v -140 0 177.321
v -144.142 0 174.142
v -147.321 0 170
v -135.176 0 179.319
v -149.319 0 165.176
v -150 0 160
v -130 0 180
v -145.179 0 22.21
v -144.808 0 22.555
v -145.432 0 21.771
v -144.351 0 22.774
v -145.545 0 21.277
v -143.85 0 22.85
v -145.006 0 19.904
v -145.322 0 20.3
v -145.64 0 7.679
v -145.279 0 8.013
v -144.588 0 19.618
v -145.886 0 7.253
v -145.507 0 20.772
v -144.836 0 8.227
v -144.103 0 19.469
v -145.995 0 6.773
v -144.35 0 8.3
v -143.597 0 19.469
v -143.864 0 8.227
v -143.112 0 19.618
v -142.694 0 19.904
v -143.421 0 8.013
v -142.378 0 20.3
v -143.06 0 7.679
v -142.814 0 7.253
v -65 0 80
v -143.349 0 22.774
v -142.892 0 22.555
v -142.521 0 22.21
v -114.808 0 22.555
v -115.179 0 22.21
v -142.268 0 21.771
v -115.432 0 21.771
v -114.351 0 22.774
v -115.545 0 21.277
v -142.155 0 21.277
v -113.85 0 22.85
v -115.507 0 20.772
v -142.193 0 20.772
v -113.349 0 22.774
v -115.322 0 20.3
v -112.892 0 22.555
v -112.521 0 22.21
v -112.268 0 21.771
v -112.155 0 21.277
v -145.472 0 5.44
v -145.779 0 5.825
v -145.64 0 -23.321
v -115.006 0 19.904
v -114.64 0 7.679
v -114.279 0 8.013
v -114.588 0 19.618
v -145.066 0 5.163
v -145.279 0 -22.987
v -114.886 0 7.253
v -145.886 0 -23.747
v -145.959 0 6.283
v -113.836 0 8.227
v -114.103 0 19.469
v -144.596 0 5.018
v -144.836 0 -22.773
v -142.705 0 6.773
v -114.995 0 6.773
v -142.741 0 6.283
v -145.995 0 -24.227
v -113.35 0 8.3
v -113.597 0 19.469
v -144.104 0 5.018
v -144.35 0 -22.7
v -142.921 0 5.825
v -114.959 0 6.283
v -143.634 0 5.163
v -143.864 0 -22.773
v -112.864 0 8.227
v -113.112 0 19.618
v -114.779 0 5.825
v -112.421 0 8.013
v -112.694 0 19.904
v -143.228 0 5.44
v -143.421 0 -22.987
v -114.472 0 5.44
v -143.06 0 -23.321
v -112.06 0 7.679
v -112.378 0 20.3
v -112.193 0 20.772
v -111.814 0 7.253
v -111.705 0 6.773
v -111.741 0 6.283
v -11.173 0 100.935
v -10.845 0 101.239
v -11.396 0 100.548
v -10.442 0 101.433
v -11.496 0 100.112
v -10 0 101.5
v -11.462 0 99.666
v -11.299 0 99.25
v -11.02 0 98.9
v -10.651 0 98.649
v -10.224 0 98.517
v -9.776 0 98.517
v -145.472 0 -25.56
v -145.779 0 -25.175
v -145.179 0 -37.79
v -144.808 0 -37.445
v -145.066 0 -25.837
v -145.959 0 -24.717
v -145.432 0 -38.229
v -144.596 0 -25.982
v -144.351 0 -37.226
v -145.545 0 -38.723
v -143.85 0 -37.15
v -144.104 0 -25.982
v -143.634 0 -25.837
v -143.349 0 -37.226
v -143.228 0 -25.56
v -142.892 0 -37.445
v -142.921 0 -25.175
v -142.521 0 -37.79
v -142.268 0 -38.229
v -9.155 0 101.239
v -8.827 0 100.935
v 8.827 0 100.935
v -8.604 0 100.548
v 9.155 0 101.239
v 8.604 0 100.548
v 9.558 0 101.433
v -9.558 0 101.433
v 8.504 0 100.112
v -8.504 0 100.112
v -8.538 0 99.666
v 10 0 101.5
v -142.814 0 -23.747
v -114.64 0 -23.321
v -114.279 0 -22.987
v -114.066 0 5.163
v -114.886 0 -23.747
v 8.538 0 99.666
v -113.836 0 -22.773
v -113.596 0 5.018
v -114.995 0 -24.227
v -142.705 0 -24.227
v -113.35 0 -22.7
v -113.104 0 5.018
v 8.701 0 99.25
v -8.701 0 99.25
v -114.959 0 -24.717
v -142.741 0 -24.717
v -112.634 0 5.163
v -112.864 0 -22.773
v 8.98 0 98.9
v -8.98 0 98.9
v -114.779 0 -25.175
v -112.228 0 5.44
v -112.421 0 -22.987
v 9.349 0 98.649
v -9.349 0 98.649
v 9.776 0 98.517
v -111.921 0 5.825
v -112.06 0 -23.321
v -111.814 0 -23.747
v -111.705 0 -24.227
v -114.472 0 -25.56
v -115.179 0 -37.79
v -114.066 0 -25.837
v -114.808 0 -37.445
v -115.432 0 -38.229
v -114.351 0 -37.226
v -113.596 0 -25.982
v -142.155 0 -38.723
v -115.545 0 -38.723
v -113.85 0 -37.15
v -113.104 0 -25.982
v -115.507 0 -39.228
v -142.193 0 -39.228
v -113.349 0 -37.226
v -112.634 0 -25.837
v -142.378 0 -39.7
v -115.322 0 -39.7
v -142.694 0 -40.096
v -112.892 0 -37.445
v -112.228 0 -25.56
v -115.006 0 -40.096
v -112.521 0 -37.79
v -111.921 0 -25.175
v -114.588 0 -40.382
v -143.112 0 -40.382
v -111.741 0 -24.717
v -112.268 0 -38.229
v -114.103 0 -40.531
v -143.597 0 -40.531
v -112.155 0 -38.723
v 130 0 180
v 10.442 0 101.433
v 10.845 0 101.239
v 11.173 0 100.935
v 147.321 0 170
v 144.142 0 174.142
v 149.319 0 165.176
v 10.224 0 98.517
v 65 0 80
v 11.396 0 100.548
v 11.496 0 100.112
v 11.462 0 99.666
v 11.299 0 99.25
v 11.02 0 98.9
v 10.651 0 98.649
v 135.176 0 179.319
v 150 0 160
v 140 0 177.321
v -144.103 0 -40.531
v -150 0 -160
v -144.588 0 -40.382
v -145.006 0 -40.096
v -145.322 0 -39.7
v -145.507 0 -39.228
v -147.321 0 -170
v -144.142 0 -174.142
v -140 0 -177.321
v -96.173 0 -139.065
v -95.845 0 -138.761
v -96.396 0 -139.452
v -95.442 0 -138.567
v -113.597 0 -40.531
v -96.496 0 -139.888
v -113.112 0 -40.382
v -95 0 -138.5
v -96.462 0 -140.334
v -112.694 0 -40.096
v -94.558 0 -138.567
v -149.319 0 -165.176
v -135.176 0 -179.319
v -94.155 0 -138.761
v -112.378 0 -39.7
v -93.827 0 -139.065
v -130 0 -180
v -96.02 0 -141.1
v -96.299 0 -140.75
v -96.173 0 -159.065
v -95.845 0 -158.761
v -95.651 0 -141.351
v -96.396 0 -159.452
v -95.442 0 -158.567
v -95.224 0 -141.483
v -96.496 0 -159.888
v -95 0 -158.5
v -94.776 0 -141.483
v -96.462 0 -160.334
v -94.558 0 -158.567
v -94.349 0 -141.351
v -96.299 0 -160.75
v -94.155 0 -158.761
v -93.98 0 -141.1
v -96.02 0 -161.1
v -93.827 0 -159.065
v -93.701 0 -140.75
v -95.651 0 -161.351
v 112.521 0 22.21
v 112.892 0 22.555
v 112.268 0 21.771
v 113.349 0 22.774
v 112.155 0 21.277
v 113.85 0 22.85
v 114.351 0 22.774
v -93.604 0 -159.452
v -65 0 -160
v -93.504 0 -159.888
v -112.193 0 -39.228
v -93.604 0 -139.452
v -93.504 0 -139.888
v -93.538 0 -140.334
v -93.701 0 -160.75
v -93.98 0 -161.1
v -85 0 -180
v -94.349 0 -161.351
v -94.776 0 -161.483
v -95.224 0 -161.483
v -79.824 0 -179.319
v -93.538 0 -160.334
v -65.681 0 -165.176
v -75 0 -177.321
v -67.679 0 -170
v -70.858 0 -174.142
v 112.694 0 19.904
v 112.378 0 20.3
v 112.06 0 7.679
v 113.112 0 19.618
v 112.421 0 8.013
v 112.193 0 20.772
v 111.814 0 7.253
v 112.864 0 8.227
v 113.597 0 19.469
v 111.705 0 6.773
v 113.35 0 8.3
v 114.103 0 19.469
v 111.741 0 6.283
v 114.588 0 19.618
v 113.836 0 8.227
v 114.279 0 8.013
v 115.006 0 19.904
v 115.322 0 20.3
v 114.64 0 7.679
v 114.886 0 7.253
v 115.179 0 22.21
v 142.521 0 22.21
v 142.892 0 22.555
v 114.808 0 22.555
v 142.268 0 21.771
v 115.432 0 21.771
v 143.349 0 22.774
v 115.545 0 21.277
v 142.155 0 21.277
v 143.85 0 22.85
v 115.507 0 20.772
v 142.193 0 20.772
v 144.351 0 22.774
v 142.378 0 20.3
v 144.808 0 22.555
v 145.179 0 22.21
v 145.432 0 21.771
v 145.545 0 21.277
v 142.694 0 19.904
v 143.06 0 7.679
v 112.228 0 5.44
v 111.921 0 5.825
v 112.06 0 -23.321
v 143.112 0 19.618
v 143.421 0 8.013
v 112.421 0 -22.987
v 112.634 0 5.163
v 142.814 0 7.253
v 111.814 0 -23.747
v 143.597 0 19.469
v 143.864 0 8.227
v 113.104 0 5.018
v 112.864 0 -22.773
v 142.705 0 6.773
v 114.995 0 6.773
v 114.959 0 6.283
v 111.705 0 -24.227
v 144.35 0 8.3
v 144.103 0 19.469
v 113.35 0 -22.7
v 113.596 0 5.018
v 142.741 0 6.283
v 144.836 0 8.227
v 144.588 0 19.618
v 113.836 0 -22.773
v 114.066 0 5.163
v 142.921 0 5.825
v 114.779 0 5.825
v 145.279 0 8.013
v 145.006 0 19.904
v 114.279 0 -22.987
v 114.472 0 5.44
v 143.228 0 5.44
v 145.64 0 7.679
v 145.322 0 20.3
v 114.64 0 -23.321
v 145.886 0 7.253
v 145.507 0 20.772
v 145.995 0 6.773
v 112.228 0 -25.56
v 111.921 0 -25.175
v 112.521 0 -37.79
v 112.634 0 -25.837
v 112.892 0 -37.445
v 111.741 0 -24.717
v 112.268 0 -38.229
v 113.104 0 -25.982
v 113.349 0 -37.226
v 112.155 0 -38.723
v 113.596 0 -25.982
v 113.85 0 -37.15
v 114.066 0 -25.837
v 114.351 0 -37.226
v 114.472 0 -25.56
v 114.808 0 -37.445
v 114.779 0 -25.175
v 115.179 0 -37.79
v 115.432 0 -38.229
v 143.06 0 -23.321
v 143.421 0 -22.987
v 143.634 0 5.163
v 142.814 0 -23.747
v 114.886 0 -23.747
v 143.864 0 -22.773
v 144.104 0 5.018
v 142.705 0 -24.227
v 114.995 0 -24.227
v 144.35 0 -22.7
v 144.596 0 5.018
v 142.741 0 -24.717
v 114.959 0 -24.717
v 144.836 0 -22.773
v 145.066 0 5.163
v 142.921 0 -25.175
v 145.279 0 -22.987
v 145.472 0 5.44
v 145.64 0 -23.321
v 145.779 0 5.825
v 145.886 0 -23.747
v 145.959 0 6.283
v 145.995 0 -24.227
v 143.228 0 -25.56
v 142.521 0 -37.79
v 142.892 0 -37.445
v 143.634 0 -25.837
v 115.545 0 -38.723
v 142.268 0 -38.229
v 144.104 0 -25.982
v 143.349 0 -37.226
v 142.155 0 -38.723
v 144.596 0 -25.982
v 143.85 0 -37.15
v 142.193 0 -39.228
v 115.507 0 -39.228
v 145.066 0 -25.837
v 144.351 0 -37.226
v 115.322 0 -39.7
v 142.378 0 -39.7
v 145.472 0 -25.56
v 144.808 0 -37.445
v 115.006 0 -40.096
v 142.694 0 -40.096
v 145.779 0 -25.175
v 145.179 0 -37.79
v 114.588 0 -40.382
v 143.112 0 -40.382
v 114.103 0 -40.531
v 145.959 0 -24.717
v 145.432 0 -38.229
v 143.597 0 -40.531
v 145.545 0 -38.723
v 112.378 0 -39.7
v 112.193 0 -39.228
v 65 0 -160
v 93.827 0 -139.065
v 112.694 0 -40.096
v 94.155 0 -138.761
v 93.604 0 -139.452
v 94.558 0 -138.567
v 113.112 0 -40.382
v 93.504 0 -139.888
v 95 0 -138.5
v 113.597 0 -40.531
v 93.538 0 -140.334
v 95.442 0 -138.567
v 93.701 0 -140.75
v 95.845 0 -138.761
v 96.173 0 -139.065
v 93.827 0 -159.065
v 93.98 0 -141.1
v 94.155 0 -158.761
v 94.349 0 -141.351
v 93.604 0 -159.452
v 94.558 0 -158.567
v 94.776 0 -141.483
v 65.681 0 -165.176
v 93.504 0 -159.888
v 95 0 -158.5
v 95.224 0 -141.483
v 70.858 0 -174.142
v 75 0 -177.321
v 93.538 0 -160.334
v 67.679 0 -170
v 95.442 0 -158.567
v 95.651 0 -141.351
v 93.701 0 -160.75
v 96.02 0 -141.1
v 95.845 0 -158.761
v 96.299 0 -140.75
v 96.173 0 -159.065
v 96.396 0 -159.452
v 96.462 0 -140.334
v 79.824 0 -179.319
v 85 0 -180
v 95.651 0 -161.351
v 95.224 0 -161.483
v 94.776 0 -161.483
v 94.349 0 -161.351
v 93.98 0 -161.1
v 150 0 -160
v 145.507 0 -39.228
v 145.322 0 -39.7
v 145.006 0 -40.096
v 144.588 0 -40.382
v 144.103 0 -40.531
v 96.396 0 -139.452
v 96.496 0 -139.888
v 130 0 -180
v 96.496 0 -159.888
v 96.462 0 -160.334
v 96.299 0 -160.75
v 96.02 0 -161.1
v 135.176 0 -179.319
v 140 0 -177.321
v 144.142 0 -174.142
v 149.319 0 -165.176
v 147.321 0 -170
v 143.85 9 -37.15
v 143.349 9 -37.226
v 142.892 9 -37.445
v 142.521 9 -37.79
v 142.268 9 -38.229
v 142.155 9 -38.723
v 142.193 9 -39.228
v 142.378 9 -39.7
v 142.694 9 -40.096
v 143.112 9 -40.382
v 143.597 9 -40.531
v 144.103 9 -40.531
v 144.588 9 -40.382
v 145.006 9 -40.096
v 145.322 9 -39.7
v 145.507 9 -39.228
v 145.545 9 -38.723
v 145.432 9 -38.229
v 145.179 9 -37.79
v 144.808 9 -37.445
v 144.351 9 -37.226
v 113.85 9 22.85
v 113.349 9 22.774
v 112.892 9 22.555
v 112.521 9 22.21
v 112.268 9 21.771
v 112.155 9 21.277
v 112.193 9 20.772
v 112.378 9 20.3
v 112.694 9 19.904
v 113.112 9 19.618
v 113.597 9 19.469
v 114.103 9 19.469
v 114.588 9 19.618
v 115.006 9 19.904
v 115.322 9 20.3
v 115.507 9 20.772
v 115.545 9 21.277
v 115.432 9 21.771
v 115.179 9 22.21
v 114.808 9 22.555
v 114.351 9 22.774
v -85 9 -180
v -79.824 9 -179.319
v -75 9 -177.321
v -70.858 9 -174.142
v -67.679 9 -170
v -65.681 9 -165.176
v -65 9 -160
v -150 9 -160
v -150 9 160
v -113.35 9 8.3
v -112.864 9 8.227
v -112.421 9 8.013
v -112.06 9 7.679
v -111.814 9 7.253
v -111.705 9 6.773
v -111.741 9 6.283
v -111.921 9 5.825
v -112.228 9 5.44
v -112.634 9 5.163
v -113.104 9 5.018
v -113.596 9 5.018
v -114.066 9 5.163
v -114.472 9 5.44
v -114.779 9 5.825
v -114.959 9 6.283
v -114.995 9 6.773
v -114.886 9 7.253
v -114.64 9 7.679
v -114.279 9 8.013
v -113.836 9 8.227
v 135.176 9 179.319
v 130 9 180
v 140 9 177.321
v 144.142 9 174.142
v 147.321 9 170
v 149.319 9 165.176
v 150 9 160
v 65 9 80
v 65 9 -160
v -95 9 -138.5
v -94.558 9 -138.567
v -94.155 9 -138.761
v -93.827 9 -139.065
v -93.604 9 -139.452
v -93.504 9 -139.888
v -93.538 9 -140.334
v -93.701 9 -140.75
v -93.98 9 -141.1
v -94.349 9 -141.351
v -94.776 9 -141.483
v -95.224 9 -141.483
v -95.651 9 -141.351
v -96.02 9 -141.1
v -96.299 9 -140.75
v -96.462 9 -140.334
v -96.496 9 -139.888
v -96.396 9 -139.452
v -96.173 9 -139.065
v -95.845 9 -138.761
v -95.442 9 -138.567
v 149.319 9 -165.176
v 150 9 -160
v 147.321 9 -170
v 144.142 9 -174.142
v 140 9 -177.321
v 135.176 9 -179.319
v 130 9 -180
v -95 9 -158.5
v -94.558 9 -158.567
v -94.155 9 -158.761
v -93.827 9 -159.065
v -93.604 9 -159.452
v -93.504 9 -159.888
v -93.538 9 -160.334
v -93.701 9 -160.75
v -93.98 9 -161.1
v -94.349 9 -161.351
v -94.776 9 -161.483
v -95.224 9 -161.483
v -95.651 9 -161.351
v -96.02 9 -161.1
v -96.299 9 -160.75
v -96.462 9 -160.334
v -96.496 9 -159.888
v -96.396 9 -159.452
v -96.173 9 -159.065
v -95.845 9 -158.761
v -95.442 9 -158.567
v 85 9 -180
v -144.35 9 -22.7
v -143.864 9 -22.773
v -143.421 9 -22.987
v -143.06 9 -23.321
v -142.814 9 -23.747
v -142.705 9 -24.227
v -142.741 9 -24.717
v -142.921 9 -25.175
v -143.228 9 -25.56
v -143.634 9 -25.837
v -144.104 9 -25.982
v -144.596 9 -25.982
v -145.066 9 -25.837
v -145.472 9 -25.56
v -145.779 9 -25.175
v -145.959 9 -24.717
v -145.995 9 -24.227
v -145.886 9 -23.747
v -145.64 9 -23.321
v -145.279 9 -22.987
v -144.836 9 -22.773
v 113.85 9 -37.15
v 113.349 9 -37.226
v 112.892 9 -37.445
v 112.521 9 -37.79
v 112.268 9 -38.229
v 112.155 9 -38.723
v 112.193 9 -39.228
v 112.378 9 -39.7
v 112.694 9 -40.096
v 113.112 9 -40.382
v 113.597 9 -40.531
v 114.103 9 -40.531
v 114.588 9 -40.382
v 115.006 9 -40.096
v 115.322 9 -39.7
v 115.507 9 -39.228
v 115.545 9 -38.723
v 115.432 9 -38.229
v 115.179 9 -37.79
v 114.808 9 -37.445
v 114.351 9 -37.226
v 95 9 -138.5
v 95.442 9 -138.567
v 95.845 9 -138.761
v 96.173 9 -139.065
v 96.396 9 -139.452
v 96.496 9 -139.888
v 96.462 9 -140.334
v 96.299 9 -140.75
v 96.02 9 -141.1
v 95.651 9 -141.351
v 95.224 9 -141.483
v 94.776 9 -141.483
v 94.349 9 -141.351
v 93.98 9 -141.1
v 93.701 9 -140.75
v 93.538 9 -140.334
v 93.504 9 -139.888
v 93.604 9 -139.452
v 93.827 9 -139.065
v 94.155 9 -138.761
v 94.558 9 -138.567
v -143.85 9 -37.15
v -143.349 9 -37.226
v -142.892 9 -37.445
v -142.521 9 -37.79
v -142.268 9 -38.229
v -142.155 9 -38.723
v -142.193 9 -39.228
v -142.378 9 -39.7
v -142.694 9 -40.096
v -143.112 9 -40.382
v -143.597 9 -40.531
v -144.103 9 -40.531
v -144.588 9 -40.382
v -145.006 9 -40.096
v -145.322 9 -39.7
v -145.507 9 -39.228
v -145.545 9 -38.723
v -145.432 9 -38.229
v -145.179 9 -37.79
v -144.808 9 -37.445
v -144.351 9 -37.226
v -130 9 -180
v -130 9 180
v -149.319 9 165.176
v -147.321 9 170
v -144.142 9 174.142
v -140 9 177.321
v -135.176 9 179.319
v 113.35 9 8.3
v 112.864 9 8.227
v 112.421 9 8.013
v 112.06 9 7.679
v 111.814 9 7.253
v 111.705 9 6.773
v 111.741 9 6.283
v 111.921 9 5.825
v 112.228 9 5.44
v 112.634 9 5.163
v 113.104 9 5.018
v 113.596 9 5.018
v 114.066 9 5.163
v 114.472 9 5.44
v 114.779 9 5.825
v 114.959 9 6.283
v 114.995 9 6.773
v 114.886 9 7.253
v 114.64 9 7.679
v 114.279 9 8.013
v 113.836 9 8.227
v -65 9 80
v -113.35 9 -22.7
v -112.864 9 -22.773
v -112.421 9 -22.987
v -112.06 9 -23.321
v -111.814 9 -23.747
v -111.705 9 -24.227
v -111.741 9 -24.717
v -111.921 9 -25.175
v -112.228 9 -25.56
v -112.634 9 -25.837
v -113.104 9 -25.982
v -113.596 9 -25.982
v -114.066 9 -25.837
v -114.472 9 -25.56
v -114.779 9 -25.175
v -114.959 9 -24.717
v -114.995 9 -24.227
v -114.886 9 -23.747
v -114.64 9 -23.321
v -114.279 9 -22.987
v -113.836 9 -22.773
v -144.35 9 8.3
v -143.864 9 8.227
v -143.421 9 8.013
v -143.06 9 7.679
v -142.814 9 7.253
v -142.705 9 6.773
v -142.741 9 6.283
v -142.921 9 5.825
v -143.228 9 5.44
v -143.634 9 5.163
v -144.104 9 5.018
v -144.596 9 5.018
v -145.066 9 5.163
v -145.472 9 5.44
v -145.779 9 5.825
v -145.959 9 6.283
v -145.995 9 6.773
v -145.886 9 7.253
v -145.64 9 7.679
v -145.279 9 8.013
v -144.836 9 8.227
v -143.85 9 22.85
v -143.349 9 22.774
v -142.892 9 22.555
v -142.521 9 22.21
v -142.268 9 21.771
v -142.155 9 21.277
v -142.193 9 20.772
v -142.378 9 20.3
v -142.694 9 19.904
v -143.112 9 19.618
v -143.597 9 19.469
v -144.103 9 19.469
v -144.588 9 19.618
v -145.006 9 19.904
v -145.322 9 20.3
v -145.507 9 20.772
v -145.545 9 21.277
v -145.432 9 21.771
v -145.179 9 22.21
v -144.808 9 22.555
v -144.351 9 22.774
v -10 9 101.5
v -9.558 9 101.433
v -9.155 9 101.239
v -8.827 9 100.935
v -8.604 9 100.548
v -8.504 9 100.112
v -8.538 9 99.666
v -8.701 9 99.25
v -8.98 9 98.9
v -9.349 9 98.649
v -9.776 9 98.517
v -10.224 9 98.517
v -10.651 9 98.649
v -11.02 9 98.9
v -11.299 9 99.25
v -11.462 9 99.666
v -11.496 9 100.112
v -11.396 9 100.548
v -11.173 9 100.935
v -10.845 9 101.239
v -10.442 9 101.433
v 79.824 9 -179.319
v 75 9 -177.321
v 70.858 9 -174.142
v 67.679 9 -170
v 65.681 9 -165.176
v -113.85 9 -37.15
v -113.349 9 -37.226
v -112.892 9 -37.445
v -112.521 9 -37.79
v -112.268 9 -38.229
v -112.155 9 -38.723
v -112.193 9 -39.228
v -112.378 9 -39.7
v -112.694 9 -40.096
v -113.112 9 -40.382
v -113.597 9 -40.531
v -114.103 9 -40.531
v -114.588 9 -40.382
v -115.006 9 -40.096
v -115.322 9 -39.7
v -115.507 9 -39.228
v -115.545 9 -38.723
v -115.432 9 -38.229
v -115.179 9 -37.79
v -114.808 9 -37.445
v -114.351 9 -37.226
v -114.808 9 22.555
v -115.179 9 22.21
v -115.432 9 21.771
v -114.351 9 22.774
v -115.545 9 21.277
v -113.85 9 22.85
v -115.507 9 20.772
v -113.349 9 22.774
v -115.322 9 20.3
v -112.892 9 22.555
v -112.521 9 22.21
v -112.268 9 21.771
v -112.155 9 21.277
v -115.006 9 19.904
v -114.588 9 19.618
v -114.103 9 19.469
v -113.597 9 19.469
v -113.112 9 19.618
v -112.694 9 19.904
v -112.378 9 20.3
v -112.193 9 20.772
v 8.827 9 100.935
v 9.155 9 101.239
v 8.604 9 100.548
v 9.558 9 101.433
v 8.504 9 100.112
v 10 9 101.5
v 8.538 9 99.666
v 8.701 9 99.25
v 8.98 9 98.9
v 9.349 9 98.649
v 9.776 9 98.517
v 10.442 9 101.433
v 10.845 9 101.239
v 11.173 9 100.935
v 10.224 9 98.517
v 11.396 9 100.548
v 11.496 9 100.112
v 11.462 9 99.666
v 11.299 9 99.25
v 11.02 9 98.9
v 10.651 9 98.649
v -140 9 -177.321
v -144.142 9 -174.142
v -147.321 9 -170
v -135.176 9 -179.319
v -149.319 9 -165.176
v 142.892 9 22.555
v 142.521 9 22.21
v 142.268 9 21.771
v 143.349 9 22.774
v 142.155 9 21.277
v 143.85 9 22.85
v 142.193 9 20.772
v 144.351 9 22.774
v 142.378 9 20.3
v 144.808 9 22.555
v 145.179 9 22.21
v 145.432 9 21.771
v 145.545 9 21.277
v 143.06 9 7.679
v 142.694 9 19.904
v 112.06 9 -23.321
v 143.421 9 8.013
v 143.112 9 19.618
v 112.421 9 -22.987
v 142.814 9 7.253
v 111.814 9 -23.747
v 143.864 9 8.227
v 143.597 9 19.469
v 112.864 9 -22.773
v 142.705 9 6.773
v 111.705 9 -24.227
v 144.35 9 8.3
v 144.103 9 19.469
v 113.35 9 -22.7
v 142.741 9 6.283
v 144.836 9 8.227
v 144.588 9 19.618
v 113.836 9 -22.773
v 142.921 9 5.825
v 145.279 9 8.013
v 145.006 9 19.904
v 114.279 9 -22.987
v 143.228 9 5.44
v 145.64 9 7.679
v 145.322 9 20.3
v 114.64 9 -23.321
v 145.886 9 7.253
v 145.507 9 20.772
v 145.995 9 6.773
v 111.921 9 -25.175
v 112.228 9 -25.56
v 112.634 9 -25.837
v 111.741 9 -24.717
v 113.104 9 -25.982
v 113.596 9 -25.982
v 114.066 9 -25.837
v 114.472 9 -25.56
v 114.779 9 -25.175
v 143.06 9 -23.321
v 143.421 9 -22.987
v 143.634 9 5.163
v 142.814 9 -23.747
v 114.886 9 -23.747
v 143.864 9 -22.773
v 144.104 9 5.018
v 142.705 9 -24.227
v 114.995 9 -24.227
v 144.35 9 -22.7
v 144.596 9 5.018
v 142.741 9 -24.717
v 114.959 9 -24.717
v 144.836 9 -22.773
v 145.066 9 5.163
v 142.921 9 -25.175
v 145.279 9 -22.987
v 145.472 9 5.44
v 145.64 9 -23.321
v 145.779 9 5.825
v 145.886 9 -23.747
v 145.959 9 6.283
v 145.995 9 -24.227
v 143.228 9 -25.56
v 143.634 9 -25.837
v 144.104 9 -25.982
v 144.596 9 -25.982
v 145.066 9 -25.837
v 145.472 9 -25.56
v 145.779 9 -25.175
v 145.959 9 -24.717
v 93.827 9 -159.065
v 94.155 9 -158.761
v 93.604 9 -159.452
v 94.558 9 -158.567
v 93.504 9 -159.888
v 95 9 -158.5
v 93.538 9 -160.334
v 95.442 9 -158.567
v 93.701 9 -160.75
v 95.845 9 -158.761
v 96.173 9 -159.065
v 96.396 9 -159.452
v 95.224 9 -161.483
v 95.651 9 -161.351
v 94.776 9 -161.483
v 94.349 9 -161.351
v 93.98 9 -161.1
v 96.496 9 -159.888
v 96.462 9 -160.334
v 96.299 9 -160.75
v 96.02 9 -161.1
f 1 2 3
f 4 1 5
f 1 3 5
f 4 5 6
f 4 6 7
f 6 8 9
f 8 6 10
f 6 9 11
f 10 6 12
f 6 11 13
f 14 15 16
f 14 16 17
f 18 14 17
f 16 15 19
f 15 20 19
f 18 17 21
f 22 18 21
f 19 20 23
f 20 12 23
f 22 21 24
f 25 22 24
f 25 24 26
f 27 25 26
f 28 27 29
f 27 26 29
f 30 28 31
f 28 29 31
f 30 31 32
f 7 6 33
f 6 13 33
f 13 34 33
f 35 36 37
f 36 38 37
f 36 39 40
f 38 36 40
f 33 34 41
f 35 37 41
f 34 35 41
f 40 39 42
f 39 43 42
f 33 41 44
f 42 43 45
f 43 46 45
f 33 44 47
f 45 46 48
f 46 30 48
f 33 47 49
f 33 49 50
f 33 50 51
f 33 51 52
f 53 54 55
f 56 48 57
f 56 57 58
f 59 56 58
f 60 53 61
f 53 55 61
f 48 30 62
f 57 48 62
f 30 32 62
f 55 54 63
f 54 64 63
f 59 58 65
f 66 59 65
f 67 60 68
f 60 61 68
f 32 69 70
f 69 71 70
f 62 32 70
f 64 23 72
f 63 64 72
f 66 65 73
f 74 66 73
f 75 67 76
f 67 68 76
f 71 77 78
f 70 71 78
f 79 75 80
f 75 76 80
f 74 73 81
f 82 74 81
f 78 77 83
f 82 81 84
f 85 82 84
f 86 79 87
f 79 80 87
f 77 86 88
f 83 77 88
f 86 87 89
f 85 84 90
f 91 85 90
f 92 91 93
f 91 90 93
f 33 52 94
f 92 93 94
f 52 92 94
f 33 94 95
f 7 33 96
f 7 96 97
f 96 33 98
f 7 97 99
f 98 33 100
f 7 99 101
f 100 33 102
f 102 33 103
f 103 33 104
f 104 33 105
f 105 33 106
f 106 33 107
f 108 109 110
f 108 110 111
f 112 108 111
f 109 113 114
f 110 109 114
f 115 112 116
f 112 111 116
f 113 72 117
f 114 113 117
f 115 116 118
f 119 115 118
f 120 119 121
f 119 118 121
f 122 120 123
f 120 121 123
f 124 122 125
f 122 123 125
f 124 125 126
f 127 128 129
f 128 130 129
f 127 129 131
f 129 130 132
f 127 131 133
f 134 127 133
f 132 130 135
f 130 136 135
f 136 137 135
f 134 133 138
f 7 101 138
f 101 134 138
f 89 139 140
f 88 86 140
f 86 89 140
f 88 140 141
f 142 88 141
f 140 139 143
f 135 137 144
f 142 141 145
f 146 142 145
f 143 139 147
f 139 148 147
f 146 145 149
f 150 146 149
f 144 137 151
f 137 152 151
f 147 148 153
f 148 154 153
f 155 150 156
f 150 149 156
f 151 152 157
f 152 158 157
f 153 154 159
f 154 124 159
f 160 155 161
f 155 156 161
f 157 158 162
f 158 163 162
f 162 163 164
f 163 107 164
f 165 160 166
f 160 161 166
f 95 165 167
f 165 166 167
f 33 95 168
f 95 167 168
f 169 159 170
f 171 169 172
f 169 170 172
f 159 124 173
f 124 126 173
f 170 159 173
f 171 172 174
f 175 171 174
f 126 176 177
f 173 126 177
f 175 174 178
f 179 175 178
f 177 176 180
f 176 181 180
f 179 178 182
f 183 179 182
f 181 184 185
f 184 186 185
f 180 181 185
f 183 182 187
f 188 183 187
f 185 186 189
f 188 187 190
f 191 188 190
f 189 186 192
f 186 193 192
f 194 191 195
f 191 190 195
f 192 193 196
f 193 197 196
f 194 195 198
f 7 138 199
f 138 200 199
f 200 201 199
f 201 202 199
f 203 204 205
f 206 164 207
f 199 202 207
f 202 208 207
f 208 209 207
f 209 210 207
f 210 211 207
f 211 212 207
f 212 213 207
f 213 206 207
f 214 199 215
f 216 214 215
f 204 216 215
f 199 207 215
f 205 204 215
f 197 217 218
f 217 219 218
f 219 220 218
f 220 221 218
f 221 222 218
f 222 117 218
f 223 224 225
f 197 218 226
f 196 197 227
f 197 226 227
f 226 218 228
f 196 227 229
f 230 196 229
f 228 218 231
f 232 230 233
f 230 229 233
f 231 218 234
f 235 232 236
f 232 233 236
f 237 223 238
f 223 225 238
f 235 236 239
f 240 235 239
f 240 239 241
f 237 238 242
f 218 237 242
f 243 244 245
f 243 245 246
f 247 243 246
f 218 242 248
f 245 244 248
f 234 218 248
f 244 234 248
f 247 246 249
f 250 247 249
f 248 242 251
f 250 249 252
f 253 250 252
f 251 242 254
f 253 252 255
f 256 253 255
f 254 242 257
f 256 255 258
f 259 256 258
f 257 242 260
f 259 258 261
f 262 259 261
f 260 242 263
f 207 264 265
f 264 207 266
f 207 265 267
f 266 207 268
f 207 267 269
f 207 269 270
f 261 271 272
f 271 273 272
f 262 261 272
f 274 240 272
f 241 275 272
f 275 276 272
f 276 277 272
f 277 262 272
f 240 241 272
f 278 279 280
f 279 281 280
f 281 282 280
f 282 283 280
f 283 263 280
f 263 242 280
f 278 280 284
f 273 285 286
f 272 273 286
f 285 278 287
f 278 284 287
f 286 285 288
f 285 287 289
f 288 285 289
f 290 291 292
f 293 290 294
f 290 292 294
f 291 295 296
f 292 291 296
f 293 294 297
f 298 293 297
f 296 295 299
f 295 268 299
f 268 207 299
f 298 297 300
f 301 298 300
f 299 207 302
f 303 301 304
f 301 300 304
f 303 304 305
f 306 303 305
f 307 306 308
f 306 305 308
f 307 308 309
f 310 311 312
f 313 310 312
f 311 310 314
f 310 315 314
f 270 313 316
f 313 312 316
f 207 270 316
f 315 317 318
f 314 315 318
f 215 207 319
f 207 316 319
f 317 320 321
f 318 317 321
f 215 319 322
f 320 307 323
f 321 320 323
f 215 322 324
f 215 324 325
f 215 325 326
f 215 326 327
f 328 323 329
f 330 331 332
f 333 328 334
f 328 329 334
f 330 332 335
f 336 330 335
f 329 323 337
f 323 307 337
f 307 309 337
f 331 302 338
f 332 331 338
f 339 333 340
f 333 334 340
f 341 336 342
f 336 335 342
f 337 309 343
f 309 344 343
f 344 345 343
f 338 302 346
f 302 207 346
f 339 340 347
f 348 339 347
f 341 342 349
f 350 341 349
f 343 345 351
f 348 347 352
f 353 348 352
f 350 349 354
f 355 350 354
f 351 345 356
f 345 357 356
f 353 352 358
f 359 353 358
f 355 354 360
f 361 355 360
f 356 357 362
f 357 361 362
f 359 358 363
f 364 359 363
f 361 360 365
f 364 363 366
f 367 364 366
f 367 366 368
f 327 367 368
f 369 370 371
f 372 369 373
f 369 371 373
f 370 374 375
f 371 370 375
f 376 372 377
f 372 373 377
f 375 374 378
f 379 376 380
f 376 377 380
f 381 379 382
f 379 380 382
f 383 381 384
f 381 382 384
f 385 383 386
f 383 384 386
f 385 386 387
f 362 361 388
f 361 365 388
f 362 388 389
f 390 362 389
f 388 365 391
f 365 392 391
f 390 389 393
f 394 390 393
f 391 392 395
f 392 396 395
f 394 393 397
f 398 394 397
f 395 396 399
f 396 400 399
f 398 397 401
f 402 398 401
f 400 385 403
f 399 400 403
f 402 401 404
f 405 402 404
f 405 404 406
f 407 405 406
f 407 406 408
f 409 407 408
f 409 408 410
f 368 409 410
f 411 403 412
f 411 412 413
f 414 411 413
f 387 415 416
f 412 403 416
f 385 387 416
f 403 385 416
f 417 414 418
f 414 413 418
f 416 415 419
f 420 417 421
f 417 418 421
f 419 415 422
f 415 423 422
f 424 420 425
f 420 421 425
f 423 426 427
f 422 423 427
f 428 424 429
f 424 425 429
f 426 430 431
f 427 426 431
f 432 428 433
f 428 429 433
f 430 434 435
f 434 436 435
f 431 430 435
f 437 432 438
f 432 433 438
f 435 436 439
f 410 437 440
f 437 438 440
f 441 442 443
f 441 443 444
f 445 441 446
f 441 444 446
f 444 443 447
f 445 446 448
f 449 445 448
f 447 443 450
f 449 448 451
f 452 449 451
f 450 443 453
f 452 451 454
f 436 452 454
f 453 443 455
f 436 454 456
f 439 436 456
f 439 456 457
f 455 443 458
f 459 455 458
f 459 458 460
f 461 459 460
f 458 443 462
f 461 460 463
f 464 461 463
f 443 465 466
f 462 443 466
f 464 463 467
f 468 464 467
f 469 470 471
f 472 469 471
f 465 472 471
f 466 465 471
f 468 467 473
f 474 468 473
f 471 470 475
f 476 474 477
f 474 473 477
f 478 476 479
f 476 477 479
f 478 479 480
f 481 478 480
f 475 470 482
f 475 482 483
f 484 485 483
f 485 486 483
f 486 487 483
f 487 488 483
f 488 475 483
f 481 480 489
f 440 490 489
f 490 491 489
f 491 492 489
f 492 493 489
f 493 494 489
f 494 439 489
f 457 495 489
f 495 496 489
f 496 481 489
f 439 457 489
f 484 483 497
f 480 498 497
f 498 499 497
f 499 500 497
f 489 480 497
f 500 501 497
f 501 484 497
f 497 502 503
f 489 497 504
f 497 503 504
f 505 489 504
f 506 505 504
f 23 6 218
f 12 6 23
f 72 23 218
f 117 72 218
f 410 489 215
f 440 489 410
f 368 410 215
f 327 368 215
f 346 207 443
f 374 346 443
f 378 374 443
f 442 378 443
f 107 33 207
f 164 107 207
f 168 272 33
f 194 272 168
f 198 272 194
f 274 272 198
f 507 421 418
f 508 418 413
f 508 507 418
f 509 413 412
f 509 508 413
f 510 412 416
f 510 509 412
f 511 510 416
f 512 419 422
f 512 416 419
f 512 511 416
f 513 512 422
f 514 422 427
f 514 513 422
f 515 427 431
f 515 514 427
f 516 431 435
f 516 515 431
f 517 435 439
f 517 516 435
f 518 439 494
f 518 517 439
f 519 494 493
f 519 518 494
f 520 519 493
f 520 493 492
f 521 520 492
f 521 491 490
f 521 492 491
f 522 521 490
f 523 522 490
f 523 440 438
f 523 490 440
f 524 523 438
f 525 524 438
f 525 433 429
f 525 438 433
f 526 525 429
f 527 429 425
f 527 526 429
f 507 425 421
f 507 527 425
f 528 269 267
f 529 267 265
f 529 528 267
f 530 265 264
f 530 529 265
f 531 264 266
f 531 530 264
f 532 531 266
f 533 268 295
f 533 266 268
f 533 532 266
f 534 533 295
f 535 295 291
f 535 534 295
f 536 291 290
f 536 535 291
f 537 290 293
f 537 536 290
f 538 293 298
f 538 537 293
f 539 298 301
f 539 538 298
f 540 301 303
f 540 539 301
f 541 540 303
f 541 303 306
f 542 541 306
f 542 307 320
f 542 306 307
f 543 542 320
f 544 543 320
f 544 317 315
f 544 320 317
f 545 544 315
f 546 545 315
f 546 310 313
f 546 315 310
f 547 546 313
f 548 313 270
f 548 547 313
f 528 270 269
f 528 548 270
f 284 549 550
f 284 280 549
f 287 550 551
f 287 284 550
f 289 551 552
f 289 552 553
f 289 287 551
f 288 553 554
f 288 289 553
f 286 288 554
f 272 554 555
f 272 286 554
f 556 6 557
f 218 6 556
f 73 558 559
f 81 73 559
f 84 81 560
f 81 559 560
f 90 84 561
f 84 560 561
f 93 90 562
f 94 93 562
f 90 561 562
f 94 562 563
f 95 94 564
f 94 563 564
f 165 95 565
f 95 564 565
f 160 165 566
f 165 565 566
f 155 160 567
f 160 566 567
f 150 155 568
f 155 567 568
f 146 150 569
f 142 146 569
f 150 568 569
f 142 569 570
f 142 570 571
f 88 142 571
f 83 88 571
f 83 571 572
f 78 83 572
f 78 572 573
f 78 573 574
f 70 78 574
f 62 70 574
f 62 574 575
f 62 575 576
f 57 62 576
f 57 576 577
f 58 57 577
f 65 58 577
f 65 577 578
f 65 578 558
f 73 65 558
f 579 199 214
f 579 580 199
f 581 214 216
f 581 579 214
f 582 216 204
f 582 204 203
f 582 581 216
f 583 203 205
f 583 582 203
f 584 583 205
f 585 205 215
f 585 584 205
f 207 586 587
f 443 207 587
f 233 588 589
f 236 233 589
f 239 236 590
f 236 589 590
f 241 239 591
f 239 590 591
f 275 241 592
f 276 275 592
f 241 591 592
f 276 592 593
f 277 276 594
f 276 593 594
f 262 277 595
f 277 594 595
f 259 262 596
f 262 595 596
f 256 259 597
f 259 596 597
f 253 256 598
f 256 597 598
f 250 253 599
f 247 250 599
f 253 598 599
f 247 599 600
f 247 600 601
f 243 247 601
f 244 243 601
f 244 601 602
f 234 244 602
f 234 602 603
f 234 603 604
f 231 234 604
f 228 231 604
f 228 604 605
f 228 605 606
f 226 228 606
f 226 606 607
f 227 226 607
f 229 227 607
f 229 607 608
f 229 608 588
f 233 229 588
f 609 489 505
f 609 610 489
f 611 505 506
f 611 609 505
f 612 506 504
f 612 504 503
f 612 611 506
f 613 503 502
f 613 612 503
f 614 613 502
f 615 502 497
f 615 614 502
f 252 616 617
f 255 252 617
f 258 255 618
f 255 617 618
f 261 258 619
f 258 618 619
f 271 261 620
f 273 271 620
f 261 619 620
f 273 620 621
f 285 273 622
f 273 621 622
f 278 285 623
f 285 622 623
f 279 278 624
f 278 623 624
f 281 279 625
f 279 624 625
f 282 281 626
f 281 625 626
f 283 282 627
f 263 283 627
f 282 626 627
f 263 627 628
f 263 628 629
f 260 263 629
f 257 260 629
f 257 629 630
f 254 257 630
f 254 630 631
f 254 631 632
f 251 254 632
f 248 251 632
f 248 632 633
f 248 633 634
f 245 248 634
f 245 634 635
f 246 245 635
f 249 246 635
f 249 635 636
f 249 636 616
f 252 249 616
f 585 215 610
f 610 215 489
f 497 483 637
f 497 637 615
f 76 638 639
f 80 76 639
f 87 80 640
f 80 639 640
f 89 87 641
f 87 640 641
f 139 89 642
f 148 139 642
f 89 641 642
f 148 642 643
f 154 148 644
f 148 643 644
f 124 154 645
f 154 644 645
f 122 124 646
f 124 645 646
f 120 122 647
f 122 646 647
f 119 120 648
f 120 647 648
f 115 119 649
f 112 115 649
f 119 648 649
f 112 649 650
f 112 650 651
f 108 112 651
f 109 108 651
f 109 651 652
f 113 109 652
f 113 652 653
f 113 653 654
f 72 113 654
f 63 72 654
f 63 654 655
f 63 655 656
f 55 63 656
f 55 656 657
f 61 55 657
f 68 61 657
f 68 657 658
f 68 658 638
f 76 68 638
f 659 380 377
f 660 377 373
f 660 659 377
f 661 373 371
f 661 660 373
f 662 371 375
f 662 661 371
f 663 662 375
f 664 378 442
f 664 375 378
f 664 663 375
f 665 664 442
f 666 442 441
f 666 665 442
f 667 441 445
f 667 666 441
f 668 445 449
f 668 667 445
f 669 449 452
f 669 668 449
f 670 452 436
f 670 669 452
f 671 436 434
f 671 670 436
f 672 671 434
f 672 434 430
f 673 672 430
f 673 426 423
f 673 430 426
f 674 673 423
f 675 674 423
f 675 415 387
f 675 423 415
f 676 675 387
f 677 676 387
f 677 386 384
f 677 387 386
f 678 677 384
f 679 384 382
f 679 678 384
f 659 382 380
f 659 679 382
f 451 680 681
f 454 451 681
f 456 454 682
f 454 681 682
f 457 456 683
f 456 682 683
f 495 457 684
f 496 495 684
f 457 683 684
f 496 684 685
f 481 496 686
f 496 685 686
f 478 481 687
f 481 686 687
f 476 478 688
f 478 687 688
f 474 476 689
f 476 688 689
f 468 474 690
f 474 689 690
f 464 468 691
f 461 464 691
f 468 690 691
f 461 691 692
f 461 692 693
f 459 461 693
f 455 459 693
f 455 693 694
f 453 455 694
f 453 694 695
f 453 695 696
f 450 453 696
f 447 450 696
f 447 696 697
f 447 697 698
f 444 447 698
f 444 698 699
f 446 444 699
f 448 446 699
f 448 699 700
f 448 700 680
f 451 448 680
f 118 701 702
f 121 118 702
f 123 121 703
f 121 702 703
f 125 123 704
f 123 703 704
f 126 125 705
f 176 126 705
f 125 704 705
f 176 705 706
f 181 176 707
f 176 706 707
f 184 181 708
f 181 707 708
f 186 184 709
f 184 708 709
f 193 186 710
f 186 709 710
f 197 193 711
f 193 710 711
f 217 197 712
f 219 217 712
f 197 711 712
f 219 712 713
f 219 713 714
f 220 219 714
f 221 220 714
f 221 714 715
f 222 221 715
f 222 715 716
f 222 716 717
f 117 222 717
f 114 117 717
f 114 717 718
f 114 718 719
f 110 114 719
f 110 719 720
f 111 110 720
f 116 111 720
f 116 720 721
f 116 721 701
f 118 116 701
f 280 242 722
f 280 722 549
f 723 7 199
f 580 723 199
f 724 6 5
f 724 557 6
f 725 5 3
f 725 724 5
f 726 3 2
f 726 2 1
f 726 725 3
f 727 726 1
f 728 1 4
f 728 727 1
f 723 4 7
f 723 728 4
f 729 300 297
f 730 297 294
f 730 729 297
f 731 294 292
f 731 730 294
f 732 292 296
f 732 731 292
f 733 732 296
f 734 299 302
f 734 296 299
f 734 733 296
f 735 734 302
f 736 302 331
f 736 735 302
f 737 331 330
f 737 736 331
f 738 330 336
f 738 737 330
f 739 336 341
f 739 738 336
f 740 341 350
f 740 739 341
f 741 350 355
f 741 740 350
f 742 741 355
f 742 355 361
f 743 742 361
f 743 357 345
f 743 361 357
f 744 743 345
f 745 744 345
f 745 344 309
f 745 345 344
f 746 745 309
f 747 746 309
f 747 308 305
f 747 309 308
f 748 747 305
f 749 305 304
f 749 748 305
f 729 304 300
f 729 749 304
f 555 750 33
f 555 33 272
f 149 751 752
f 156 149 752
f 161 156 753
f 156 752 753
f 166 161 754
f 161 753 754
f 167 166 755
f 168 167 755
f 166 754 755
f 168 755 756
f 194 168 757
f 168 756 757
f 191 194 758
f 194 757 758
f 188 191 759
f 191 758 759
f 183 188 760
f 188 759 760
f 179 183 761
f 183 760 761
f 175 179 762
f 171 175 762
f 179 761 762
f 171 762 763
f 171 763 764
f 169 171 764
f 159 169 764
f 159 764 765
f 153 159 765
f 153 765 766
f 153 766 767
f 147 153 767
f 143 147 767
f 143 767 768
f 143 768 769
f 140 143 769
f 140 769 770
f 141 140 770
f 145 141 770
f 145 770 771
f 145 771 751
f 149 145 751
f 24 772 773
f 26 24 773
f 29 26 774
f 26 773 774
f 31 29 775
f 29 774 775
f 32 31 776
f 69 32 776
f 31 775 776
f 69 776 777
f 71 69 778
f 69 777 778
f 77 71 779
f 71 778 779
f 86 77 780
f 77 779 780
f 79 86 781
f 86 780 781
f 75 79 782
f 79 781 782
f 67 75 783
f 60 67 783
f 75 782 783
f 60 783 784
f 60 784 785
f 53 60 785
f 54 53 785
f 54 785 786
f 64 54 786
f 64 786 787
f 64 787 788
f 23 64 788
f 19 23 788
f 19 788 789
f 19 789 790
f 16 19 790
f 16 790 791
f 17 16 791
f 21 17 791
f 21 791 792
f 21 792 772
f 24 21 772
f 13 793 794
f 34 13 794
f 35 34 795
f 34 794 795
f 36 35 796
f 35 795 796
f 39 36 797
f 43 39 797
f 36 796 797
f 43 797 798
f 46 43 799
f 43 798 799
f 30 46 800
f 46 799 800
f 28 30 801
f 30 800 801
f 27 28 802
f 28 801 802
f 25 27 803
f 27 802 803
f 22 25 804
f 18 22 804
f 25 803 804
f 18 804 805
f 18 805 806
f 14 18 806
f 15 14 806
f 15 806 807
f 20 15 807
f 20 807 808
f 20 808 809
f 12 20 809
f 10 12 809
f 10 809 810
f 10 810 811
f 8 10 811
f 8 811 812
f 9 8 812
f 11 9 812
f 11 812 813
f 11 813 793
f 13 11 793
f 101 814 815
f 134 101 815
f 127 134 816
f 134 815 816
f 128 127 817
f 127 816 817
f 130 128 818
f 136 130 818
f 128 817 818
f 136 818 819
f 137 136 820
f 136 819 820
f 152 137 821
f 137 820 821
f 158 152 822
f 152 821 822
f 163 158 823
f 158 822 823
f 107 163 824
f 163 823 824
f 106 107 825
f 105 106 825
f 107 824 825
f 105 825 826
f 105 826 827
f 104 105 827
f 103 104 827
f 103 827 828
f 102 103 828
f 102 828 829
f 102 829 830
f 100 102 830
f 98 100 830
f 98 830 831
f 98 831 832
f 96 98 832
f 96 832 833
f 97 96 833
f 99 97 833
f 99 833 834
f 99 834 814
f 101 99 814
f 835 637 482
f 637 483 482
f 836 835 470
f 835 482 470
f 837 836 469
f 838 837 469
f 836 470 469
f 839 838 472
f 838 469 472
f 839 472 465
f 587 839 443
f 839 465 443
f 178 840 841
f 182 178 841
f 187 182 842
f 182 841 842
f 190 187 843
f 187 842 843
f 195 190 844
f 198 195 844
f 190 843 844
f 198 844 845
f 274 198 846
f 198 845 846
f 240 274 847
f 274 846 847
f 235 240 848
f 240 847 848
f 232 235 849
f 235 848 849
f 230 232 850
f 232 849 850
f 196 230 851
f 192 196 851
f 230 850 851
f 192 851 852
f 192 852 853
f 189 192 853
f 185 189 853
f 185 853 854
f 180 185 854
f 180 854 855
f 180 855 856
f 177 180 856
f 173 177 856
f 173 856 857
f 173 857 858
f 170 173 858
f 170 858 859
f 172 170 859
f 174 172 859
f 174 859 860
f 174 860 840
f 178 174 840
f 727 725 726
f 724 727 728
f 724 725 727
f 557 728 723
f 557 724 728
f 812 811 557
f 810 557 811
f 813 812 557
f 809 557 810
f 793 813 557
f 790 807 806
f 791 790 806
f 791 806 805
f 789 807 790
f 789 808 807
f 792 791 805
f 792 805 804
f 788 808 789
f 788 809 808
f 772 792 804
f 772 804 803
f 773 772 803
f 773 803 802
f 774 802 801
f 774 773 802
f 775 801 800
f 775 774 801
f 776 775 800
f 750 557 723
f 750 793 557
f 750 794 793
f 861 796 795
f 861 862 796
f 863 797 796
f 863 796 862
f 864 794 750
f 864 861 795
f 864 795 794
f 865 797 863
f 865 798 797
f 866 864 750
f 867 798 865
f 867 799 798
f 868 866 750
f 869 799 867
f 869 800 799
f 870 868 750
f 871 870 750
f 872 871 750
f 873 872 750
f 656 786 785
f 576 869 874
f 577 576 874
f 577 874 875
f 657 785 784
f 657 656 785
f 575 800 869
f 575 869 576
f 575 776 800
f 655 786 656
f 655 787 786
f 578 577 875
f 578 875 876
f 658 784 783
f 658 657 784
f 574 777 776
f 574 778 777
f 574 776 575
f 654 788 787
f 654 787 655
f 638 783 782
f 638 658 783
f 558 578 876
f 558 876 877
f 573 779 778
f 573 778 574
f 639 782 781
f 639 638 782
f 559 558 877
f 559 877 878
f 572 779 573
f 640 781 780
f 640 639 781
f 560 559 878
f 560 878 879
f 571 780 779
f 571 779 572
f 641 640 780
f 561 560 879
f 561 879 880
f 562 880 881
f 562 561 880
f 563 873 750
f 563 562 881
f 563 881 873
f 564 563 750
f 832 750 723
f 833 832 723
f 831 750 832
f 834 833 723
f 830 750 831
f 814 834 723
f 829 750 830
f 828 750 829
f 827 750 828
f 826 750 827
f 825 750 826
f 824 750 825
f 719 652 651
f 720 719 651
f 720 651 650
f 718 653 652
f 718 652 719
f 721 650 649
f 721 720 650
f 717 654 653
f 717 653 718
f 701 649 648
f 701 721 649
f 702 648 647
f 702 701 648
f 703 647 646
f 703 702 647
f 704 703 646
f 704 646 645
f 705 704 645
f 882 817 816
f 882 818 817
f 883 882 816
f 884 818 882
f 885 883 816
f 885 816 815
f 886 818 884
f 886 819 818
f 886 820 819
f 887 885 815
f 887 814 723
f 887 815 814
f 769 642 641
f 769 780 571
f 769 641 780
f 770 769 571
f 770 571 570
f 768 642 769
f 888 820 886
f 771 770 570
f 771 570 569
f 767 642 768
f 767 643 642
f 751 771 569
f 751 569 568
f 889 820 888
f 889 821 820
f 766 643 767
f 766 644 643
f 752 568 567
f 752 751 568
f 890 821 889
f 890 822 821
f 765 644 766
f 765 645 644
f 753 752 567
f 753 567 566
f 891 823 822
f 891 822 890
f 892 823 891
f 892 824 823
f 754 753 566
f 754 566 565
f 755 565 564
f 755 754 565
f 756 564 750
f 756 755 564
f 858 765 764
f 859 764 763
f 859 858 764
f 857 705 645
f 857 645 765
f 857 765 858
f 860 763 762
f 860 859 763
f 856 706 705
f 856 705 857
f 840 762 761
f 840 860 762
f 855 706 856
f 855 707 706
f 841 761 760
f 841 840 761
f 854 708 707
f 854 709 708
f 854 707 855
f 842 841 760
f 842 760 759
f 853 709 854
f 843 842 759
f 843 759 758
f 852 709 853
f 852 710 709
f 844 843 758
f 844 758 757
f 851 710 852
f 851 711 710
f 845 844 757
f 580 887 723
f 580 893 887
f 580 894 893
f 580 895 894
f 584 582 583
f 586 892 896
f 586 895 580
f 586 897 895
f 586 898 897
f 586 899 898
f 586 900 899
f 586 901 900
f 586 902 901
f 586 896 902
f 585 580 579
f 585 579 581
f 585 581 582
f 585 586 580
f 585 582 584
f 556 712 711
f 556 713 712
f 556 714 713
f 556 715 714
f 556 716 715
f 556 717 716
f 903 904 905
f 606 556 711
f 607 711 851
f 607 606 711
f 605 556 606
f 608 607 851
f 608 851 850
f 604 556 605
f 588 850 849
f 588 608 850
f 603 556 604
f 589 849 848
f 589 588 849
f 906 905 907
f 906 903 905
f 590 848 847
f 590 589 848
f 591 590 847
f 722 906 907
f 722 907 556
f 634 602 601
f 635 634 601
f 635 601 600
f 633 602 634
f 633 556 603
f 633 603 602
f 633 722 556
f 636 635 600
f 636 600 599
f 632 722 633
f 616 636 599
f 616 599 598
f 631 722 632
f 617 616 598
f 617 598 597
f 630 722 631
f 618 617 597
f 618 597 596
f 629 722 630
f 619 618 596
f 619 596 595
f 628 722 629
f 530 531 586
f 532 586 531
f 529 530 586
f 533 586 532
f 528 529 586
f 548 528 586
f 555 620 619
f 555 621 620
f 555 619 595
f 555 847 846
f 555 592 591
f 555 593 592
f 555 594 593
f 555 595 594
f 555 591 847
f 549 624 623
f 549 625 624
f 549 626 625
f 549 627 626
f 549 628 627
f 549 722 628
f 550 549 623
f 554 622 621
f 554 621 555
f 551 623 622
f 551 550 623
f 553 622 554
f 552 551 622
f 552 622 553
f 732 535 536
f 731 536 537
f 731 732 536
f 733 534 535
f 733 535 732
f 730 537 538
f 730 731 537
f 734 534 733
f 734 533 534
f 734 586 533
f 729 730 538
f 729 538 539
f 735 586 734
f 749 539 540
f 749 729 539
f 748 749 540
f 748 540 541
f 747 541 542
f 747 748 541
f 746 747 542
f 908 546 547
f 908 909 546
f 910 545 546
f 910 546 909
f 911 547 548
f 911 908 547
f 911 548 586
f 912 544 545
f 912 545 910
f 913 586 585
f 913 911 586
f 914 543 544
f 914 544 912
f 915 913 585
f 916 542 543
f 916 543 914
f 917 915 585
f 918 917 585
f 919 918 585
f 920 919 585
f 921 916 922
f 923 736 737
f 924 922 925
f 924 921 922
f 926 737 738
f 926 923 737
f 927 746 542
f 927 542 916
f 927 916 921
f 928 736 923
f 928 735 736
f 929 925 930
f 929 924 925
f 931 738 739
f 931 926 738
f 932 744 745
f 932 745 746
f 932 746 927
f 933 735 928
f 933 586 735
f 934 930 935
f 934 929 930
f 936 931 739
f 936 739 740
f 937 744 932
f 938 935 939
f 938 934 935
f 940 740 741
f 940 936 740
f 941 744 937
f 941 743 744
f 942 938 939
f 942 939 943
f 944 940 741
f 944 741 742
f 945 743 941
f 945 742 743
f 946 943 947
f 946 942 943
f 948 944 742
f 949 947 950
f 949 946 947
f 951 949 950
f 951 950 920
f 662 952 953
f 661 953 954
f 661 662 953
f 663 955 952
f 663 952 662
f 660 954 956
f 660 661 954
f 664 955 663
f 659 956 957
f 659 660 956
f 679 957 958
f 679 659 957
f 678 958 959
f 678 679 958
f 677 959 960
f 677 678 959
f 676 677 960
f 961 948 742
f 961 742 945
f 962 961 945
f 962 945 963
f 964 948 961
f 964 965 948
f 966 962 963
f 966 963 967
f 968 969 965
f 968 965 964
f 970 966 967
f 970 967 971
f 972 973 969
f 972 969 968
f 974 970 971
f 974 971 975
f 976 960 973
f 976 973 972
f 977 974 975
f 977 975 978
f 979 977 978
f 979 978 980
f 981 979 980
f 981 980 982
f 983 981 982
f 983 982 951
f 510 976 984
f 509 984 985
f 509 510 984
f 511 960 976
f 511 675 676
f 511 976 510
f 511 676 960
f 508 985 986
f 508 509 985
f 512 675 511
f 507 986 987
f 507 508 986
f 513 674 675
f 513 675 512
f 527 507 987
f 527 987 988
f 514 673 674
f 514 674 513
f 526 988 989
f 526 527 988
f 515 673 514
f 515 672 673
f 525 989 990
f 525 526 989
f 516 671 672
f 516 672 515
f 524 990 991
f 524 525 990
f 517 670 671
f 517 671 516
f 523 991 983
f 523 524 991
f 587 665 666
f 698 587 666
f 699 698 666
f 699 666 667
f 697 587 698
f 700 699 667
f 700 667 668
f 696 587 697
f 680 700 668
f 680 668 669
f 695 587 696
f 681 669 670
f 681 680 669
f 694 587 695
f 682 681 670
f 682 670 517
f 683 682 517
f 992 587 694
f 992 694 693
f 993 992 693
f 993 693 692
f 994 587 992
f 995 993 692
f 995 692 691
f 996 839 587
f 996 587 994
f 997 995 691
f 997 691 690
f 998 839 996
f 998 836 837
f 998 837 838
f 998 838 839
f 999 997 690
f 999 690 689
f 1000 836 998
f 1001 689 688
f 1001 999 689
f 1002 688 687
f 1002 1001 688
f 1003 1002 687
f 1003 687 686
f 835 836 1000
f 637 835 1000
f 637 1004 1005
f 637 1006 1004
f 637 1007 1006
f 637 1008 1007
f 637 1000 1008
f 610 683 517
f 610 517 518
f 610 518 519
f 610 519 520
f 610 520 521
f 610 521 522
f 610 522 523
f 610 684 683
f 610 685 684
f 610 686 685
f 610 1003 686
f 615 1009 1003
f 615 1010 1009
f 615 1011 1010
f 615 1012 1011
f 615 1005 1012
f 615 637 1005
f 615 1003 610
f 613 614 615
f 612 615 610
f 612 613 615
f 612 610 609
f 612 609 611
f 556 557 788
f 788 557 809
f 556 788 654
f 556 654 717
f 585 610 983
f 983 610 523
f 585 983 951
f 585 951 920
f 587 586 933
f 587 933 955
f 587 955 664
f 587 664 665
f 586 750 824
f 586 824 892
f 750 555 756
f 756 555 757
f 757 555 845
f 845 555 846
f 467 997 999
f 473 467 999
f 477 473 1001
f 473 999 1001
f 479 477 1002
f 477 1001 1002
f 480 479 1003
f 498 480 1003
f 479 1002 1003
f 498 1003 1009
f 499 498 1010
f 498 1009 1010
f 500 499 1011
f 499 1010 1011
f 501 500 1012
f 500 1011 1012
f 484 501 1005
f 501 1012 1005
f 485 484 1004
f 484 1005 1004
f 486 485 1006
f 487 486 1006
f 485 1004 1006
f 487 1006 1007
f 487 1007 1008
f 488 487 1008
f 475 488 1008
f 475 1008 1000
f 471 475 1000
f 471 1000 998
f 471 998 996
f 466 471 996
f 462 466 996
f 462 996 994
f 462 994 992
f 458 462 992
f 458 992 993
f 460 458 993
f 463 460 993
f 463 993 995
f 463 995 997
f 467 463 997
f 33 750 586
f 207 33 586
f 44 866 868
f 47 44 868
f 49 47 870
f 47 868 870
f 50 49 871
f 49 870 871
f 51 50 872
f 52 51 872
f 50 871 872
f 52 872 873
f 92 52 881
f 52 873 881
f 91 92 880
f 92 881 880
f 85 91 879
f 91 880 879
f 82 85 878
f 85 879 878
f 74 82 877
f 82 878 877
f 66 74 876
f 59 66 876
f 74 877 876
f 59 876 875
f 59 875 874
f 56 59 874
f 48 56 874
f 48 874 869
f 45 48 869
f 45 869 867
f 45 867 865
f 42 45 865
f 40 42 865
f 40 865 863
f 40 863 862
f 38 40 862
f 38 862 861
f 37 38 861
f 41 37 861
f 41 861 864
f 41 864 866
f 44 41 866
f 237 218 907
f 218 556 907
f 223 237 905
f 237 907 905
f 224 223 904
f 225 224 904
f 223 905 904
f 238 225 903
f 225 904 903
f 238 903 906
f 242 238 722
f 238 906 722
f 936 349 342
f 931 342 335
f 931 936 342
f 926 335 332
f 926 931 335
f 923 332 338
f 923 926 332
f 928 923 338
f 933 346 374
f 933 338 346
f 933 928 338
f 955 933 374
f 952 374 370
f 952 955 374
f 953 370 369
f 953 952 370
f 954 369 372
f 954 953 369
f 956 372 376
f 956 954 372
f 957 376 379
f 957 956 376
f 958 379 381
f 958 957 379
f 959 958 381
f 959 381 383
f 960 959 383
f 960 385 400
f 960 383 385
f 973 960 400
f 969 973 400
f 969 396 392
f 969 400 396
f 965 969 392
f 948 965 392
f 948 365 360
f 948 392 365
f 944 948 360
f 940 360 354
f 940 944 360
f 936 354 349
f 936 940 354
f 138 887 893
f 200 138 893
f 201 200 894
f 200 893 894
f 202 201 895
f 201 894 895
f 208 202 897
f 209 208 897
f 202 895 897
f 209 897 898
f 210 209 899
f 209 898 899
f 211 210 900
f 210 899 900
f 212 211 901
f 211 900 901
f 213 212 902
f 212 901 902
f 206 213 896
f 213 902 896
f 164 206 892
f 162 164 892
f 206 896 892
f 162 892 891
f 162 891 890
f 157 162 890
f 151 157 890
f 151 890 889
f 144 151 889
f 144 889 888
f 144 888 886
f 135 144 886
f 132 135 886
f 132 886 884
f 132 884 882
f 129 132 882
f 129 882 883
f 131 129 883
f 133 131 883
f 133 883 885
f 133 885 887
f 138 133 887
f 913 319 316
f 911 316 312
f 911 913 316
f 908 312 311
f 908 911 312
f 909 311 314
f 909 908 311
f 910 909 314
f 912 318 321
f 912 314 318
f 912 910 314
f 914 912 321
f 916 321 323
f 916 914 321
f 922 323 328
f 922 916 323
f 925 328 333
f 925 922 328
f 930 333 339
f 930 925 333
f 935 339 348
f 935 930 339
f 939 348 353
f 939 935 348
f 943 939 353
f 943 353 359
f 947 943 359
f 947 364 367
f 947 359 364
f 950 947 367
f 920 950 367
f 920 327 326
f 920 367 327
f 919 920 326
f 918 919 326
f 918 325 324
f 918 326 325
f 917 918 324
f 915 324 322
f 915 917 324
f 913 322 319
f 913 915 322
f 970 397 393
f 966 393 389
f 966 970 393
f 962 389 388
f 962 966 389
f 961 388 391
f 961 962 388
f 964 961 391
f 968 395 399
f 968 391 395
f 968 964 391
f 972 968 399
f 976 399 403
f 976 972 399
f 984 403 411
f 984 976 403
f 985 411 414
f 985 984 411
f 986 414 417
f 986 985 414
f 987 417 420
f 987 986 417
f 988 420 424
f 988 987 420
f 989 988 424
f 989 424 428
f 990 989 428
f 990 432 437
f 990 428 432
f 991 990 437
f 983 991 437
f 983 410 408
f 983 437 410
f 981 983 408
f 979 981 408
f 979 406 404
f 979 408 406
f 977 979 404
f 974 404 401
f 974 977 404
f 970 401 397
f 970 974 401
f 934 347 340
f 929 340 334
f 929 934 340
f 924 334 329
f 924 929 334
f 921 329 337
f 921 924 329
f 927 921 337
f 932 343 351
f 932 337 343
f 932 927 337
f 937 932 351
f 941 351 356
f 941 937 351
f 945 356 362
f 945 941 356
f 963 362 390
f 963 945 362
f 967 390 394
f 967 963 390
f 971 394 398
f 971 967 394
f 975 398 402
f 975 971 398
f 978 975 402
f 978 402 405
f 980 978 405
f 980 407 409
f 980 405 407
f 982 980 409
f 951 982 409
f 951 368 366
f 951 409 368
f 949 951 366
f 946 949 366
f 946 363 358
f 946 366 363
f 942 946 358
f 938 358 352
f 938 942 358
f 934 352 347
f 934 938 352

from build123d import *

# Parameters (mm, degrees)
SKETCH_1_W          = 300
SKETCH_1_H          = 360
EXTRUDE_1_DEPTH     = 9
SKETCH_2_W          = 130
SKETCH_2_H          = 260
CUT_EXTRUDE_1_DEPTH = 9
SKETCH_3_R          = 1.5
CUT_EXTRUDE_2_DEPTH = 10
FILLET_1_R          = 20
SKETCH_5_R          = 1.65
SKETCH_5_R_2        = 1.7
CUT_EXTRUDE_4_DEPTH = 10


with BuildPart() as part:
    # 草图1 → 凸台-拉伸1 (new body)
    with BuildSketch(Plane(origin=(0, 0, 0), x_dir=(1, 0, 0), z_dir=(0, 1, 0))):
        Rectangle(SKETCH_1_W, SKETCH_1_H)
    extrude(amount=EXTRUDE_1_DEPTH)

    # 草图2 → 切除-拉伸1 (cut)
    with BuildSketch(Plane(origin=(0, 9, 0), x_dir=(1, 0, 0), z_dir=(0, 1, 0))):
        with Locations((0, 50)):
            Rectangle(SKETCH_2_W, SKETCH_2_H)
    extrude(amount=-CUT_EXTRUDE_1_DEPTH, mode=Mode.SUBTRACT)

    # 草图3 → 切除-拉伸2 (cut)
    with BuildSketch(Plane(origin=(0, 9, 0), x_dir=(1, 0, 0), z_dir=(0, 1, 0))):
        with Locations(Location((-95, 160, 0), (0, 0, 270))):
            Circle(SKETCH_3_R)
        with Locations(Location((-95, 140, 0), (0, 0, 270))):
            Circle(SKETCH_3_R)
        with Locations(Location((95, 140, 0), (0, 0, 270))):
            Circle(SKETCH_3_R)
        with Locations(Location((95, 160, 0), (0, 0, 270))):
            Circle(SKETCH_3_R)
        with Locations(Location((-10, -100, 0), (0, 0, 270))):
            Circle(SKETCH_3_R)
        with Locations(Location((10, -100, 0), (0, 0, 270))):
            Circle(SKETCH_3_R)
    extrude(amount=-CUT_EXTRUDE_2_DEPTH, mode=Mode.SUBTRACT)

    # 圆角1
    fillet_1_edges = [part.edges().sort_by_distance(p)[0] for p in [
        (65, 4.5, -180),
        (-65, 4.5, -180),
        (150, 4.5, 180),
        (-150, 4.5, 180),
        (-150, 4.5, -180),
        (150, 4.5, -180),
    ]]
    fillet(fillet_1_edges, radius=FILLET_1_R)

    # 草图5 → 切除-拉伸4 (cut)
    with BuildSketch(Plane(origin=(0, 9, 0), x_dir=(1, 0, 0), z_dir=(0, 1, 0))):
        with Locations(Location((-113.35, 24.35, 0), (0, 0, 270))):
            Circle(SKETCH_5_R)
        with Locations(Location((-144.35, 24.35, 0), (0, 0, 270))):
            Circle(SKETCH_5_R)
        with Locations(Location((-143.85, 38.85, 0), (0, 0, 270))):
            Circle(SKETCH_5_R_2)
        with Locations(Location((-113.85, 38.85, 0), (0, 0, 270))):
            Circle(SKETCH_5_R_2)
        with Locations(Location((-144.35, -6.65, 0), (0, 0, 270))):
            Circle(SKETCH_5_R)
        with Locations(Location((-143.85, -21.15, 0), (0, 0, 270))):
            Circle(SKETCH_5_R_2)
        with Locations(Location((-113.85, -21.15, 0), (0, 0, 270))):
            Circle(SKETCH_5_R_2)
        with Locations(Location((-113.35, -6.65, 0), (0, 0, 270))):
            Circle(SKETCH_5_R)
    cut_extrude_4 = extrude(amount=-CUT_EXTRUDE_4_DEPTH, mode=Mode.SUBTRACT)

    # 镜向2: 切除-拉伸4 across plane
    add(cut_extrude_4.mirror(Plane(origin=(0, 0, 0), x_dir=(0, 0, 1), z_dir=(1, 0, 0))), mode=Mode.SUBTRACT)


solid = part.part
